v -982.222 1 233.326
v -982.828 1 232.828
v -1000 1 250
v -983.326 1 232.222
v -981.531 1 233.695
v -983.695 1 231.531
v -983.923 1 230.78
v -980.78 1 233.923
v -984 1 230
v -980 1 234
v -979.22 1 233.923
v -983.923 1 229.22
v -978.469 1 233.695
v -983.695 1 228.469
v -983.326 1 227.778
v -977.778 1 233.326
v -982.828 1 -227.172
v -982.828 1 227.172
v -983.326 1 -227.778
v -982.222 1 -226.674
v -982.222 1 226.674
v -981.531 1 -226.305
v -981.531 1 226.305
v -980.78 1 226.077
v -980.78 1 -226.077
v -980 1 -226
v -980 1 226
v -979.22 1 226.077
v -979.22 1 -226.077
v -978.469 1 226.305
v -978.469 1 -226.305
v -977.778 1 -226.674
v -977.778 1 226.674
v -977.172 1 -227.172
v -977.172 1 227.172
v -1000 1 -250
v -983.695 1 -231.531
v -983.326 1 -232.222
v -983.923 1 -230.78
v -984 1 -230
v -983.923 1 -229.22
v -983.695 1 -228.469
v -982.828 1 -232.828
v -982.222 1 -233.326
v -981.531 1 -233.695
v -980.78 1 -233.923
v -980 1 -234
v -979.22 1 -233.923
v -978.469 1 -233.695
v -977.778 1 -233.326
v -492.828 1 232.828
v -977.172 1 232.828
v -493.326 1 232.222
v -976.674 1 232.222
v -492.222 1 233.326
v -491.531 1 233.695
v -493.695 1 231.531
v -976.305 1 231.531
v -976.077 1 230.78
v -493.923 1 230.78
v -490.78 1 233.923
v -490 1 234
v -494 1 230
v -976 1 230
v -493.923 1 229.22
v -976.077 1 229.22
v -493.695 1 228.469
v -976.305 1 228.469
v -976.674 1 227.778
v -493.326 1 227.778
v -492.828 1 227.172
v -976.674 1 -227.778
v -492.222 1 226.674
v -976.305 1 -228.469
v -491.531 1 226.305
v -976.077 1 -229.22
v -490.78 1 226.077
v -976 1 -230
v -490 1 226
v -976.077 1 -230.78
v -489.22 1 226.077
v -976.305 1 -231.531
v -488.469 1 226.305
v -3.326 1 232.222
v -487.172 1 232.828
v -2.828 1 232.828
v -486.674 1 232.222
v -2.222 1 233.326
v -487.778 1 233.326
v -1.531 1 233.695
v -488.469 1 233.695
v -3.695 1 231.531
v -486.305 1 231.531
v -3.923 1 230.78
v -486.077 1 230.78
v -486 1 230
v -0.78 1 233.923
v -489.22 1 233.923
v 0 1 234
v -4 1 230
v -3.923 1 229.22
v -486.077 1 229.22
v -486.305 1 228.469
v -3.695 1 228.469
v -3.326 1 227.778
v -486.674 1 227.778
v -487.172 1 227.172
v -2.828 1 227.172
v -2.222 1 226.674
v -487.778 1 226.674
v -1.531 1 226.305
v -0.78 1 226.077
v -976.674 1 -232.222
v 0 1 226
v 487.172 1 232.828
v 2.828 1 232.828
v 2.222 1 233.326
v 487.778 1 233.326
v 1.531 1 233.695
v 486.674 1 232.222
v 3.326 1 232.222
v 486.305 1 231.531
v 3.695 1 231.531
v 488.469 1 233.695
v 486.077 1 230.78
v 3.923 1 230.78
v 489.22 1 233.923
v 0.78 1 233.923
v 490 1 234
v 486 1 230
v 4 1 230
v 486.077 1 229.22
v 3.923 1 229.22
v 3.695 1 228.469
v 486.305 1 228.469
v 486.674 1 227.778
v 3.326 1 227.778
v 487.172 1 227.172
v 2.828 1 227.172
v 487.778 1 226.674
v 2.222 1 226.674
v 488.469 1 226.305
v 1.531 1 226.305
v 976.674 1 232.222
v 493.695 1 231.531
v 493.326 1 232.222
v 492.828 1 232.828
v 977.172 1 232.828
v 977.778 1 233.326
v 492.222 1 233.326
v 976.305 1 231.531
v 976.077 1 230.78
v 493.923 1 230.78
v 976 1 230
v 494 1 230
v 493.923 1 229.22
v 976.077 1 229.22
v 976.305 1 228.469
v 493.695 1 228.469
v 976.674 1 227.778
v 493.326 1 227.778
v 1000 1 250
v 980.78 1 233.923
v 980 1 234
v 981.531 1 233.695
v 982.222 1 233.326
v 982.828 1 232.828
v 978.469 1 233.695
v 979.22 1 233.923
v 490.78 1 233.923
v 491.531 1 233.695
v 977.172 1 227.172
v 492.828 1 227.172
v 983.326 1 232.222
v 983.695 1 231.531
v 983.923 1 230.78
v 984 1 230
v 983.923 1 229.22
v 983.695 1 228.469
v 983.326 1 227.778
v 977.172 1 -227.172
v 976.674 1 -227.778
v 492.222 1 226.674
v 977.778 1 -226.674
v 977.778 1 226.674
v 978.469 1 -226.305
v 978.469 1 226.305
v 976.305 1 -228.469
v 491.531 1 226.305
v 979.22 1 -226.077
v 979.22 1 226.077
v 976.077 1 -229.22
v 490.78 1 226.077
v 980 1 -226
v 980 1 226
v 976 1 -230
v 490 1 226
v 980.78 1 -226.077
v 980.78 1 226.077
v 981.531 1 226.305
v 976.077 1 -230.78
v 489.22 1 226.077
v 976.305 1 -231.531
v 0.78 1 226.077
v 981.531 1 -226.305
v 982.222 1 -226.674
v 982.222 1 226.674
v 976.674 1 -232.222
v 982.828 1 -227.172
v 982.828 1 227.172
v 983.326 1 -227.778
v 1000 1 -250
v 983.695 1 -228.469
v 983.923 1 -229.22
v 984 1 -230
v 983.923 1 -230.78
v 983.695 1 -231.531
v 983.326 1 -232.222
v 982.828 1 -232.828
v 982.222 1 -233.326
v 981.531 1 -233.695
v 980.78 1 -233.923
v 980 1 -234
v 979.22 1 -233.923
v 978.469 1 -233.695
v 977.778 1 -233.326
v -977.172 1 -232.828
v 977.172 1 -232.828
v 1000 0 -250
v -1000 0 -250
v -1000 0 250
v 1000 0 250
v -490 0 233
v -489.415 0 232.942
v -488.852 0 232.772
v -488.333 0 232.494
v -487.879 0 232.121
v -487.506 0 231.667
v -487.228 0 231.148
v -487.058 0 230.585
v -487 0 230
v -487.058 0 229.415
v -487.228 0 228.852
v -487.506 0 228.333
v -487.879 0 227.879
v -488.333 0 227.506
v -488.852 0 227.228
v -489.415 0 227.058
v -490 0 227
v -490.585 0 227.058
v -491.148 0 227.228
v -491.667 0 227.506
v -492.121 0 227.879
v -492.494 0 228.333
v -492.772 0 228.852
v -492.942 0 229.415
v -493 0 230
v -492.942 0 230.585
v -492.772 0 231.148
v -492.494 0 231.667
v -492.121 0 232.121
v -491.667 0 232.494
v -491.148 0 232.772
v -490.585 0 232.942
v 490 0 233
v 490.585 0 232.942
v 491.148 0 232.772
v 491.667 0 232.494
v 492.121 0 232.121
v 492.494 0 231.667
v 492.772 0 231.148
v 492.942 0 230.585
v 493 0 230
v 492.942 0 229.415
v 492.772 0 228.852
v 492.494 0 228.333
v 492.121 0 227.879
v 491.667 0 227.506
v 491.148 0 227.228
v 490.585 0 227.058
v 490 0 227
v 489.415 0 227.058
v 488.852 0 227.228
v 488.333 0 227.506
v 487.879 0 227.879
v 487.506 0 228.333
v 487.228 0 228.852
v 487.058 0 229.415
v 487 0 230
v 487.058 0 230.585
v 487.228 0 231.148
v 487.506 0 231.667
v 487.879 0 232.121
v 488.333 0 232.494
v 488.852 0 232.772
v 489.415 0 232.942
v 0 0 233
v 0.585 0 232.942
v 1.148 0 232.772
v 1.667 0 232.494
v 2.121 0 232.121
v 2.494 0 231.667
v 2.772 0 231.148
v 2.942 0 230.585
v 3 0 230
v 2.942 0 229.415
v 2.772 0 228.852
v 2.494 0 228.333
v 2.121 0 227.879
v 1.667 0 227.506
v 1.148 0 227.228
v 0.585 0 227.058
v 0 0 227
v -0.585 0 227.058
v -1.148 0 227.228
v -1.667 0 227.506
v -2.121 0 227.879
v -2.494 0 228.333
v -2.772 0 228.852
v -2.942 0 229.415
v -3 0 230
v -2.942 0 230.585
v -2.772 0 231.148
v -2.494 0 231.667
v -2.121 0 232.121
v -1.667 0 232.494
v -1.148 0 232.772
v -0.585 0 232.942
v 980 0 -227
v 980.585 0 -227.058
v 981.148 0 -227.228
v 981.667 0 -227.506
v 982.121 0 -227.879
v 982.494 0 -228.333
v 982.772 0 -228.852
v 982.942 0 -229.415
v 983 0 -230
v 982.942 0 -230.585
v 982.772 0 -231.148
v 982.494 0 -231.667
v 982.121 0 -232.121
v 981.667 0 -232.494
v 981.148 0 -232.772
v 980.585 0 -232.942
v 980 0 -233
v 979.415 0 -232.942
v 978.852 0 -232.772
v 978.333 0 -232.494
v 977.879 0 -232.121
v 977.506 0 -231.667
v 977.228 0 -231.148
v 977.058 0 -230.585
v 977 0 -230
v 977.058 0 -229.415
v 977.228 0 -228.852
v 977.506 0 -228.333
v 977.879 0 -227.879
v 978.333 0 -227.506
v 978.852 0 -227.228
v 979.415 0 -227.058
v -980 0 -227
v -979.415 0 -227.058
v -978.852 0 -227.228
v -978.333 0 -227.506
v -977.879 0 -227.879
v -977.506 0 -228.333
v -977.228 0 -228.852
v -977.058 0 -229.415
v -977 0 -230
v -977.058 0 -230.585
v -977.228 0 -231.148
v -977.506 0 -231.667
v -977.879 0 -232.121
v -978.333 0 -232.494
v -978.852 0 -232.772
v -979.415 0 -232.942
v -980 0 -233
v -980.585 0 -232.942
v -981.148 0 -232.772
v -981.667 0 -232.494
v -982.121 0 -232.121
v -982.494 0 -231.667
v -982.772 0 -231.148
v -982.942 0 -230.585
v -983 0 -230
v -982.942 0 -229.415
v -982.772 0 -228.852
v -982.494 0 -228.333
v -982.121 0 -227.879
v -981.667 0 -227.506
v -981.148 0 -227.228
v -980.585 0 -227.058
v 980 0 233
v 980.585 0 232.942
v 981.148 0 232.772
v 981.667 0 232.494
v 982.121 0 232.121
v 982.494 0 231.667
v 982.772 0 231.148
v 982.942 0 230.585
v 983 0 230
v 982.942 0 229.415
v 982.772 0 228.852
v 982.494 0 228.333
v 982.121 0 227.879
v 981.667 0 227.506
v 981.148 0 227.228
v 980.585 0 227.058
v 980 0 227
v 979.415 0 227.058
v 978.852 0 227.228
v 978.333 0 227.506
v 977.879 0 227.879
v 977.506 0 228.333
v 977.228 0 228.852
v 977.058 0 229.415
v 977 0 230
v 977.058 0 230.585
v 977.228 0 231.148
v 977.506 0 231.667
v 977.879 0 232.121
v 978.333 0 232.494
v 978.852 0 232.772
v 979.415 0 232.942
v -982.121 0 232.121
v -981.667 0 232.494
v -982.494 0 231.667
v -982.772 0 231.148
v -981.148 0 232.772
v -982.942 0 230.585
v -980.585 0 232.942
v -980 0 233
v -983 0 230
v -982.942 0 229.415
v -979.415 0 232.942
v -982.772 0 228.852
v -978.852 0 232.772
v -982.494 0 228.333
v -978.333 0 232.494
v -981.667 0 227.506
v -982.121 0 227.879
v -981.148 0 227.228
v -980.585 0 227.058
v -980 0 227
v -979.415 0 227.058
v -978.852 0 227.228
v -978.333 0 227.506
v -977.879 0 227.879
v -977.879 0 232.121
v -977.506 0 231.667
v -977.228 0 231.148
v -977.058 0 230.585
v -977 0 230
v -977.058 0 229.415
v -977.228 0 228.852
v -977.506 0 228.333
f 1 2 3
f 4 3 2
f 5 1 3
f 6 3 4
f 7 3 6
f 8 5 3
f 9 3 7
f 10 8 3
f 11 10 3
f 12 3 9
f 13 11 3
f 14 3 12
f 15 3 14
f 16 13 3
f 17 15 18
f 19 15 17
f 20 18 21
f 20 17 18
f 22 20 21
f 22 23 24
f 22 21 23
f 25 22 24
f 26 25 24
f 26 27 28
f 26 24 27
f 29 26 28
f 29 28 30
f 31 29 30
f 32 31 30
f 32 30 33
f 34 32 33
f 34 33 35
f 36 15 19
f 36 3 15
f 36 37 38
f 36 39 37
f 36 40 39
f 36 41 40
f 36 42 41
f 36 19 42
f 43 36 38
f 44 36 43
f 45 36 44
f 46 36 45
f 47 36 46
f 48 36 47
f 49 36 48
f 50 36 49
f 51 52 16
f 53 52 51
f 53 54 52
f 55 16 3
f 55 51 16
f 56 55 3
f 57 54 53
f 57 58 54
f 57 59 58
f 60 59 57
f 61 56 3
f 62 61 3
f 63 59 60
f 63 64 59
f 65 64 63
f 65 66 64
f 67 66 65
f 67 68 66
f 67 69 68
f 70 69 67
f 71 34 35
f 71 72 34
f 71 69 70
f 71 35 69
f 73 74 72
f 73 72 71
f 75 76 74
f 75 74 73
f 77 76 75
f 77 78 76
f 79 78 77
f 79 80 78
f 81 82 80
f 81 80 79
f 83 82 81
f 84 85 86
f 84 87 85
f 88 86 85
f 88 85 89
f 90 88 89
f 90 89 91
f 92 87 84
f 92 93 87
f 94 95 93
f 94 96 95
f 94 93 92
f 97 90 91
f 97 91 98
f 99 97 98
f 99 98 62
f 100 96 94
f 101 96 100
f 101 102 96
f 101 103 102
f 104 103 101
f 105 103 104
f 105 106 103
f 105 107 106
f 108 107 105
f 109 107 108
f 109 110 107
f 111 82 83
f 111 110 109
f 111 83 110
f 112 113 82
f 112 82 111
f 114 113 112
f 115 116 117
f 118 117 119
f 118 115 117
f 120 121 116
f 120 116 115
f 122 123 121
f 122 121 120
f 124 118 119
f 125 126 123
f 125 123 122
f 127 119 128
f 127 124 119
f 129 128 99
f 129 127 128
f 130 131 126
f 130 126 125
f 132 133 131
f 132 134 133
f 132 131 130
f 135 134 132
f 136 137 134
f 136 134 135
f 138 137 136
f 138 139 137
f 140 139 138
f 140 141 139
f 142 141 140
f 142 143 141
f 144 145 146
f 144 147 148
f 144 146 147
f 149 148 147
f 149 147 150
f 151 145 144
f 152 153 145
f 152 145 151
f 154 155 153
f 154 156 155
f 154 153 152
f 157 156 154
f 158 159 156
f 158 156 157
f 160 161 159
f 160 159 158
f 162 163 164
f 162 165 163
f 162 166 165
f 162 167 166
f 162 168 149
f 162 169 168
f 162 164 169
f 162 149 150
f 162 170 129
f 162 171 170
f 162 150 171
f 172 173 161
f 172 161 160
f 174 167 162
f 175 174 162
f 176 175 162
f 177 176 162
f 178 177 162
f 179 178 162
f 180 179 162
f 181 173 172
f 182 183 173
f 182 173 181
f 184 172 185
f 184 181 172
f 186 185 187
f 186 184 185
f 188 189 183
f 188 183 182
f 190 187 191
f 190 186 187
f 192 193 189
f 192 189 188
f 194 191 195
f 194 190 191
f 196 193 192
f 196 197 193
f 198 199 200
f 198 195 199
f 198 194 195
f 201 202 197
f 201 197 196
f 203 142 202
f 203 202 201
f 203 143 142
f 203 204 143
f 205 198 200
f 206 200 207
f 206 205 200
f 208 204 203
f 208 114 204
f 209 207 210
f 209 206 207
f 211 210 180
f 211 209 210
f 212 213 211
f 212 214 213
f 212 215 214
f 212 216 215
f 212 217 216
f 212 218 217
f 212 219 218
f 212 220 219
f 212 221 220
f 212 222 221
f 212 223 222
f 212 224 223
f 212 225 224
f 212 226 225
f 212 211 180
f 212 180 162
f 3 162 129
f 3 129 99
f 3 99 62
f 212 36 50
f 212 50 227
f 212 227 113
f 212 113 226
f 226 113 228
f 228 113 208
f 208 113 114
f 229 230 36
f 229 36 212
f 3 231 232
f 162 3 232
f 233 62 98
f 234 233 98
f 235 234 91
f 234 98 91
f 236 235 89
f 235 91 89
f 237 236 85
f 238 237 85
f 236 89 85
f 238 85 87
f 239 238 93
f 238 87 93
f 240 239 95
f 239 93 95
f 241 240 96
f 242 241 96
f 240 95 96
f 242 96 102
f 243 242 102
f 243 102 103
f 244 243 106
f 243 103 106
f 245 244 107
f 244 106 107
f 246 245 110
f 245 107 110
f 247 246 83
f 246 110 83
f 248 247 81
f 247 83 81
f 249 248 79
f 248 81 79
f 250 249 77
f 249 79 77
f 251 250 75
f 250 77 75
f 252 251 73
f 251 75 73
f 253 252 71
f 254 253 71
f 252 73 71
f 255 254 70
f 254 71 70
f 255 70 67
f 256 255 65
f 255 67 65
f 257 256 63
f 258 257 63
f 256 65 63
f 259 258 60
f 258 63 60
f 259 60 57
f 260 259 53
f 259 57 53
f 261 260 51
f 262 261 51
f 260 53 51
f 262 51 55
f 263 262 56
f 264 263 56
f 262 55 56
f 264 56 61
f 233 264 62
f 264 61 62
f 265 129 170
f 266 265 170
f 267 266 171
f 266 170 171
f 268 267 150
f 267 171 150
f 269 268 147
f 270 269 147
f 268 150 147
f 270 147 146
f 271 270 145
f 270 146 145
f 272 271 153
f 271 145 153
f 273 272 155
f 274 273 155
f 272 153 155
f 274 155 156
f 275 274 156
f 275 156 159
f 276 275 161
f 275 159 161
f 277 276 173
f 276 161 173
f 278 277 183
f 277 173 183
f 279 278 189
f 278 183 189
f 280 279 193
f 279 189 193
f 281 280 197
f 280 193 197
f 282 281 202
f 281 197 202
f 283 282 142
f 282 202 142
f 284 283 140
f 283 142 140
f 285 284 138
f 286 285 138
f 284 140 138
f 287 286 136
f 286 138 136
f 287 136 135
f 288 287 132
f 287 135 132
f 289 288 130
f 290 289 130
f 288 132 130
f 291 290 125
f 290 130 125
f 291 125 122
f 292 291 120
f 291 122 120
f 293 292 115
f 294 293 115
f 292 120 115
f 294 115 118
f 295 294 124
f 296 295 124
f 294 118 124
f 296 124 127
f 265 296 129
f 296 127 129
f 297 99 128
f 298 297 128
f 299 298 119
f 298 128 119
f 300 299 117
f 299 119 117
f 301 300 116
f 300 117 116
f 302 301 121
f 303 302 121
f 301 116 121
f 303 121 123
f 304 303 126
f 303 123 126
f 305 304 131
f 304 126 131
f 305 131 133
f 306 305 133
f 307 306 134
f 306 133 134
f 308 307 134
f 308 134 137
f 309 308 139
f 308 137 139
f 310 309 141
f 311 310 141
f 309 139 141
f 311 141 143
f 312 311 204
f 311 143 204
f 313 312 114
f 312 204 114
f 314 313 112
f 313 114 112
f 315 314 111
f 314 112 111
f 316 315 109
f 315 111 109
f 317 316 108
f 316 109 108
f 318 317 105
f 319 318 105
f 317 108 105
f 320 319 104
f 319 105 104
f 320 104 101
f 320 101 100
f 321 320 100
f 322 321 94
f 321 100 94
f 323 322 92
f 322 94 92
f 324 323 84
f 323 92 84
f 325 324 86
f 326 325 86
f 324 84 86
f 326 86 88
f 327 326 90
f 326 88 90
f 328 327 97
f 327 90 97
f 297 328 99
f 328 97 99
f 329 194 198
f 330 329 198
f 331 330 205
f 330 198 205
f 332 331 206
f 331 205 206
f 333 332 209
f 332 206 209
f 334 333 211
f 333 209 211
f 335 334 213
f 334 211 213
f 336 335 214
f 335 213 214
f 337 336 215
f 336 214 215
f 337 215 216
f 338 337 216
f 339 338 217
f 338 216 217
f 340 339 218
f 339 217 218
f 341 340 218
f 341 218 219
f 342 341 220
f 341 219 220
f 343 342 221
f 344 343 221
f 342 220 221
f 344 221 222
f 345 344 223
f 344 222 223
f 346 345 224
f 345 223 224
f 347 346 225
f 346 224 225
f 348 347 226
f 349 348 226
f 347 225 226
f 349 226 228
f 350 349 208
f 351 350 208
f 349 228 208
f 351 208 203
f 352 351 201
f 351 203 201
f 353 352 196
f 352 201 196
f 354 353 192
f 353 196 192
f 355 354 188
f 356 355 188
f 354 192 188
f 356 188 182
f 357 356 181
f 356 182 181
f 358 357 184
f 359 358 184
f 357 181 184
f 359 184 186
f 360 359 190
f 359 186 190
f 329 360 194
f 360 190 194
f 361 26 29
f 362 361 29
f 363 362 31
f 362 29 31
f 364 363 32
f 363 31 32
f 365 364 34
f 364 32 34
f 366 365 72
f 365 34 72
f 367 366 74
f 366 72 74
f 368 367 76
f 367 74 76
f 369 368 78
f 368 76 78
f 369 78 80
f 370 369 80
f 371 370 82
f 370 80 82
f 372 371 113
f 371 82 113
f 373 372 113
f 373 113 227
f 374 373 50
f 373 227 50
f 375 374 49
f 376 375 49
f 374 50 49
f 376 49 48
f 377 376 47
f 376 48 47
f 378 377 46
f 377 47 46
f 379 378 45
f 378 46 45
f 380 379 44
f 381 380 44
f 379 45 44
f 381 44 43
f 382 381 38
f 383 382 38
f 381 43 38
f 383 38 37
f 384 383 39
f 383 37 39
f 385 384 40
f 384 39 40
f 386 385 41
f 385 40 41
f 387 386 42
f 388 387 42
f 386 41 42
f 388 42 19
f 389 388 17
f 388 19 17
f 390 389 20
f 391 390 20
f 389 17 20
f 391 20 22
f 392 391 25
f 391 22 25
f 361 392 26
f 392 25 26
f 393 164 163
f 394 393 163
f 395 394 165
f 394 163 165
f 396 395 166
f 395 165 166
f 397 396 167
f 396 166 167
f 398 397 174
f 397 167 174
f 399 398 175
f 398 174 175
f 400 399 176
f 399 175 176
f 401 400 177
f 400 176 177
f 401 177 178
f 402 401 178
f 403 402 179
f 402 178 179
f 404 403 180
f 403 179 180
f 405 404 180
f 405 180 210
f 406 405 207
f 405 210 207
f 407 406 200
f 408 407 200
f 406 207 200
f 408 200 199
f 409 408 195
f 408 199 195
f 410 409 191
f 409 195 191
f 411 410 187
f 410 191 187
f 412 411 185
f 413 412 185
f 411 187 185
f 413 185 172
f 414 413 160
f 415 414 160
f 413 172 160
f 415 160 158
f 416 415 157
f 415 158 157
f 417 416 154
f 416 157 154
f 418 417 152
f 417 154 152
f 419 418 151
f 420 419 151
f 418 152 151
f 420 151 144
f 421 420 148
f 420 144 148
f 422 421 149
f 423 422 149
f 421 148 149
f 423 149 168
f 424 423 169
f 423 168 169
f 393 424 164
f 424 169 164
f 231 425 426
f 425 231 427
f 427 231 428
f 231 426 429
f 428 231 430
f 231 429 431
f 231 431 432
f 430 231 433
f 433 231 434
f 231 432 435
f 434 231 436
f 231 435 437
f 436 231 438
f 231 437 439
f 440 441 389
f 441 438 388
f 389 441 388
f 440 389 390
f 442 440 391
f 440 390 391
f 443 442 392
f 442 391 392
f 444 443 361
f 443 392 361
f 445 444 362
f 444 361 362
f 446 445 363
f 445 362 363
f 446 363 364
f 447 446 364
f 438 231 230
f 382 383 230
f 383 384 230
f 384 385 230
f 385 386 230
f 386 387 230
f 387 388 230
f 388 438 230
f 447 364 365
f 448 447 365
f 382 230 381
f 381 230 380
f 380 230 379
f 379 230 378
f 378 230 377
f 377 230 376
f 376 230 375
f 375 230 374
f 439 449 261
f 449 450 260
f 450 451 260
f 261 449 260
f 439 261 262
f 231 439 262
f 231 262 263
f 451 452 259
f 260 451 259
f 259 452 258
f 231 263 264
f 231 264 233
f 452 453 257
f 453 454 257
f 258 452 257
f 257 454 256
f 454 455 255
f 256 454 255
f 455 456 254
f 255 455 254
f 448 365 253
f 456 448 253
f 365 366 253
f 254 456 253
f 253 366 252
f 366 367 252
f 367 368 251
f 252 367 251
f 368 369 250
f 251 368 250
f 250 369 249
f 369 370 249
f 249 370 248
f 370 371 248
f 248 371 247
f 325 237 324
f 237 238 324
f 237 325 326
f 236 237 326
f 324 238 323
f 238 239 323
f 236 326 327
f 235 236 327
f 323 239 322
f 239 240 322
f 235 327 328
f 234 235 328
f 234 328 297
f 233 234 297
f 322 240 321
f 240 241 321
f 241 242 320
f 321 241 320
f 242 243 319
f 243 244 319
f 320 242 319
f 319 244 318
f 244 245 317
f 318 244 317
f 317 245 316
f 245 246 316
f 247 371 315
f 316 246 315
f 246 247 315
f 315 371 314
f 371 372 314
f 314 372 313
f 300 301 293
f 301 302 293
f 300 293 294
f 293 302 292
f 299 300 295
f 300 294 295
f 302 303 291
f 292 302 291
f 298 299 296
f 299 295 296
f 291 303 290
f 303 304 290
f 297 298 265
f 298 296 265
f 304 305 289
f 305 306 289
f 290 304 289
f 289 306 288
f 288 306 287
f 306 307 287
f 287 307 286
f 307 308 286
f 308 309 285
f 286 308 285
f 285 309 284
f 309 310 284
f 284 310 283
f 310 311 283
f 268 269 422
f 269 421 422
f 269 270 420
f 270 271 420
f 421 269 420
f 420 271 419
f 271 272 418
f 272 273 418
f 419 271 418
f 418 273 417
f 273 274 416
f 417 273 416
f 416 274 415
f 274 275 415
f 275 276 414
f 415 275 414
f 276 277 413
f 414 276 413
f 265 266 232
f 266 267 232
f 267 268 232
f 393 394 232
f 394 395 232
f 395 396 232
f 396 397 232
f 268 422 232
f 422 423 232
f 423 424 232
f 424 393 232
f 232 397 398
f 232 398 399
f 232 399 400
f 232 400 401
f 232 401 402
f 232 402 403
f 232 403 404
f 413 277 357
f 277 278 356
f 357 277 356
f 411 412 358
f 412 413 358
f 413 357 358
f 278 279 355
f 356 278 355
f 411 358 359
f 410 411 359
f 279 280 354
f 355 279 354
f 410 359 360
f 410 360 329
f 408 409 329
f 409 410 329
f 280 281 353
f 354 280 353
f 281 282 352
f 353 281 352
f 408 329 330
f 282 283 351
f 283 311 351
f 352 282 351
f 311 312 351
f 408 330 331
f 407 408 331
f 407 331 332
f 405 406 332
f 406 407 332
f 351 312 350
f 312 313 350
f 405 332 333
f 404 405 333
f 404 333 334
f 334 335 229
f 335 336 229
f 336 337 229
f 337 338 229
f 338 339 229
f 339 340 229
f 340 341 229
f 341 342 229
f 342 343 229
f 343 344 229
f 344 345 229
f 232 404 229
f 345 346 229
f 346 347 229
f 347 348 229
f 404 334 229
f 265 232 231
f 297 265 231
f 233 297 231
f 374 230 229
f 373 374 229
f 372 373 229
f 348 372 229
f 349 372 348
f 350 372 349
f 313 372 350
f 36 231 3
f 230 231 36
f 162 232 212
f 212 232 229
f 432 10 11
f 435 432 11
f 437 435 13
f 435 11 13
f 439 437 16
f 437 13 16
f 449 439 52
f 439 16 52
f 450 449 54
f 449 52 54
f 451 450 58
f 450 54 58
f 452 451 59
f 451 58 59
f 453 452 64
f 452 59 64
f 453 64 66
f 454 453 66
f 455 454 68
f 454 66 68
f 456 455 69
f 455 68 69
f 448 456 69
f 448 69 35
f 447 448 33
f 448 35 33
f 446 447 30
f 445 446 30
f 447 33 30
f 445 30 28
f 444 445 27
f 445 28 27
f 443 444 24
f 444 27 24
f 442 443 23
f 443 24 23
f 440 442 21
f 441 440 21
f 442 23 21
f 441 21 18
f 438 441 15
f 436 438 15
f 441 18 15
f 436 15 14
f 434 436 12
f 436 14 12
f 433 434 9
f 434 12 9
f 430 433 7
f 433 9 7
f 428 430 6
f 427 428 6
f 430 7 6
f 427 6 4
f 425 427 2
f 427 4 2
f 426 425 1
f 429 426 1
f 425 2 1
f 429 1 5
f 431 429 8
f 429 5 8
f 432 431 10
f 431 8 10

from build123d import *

# Parameters (mm, degrees)
SKETCH1_W           = 2000
SKETCH1_H           = 500
SKETCH1_R           = 3
BOSS_EXTRUDE1_DEPTH = 1
CHAMFER1_SIZE       = 1


with BuildPart() as part:
    # Sketch1 → Boss-Extrude1 (new body)
    with BuildSketch(Plane(origin=(0, 0, 0), x_dir=(1, 0, 0), z_dir=(0, 1, 0))):
        Rectangle(SKETCH1_W, SKETCH1_H)
        with Locations(Location((-980, -230, 0), (0, 0, 270))):
            Circle(SKETCH1_R, mode=Mode.SUBTRACT)
        with Locations(Location((980, -230, 0), (0, 0, 270))):
            Circle(SKETCH1_R, mode=Mode.SUBTRACT)
        with Locations(Location((0, -230, 0), (0, 0, 270))):
            Circle(SKETCH1_R, mode=Mode.SUBTRACT)
        with Locations(Location((-490, -230, 0), (0, 0, 270))):
            Circle(SKETCH1_R, mode=Mode.SUBTRACT)
        with Locations(Location((490, -230, 0), (0, 0, 270))):
            Circle(SKETCH1_R, mode=Mode.SUBTRACT)
        with Locations(Location((980, 230, 0), (0, 0, 270))):
            Circle(SKETCH1_R, mode=Mode.SUBTRACT)
        with Locations(Location((-980, 230, 0), (0, 0, 270))):
            Circle(SKETCH1_R, mode=Mode.SUBTRACT)
    extrude(amount=BOSS_EXTRUDE1_DEPTH)

    # Chamfer1
    chamfer1_edges = [part.edges().sort_by_distance(p)[0] for p in [
        (980, 1, -233),
        (-980, 1, -233),
        (-980, 1, 227),
        (980, 1, 227),
        (0, 1, 227),
        (-490, 1, 227),
        (490, 1, 227),
    ]]
    chamfer(chamfer1_edges, length=CHAMFER1_SIZE - 0.0001)  # a hair under: the kernel refuses the full size


solid = part.part
